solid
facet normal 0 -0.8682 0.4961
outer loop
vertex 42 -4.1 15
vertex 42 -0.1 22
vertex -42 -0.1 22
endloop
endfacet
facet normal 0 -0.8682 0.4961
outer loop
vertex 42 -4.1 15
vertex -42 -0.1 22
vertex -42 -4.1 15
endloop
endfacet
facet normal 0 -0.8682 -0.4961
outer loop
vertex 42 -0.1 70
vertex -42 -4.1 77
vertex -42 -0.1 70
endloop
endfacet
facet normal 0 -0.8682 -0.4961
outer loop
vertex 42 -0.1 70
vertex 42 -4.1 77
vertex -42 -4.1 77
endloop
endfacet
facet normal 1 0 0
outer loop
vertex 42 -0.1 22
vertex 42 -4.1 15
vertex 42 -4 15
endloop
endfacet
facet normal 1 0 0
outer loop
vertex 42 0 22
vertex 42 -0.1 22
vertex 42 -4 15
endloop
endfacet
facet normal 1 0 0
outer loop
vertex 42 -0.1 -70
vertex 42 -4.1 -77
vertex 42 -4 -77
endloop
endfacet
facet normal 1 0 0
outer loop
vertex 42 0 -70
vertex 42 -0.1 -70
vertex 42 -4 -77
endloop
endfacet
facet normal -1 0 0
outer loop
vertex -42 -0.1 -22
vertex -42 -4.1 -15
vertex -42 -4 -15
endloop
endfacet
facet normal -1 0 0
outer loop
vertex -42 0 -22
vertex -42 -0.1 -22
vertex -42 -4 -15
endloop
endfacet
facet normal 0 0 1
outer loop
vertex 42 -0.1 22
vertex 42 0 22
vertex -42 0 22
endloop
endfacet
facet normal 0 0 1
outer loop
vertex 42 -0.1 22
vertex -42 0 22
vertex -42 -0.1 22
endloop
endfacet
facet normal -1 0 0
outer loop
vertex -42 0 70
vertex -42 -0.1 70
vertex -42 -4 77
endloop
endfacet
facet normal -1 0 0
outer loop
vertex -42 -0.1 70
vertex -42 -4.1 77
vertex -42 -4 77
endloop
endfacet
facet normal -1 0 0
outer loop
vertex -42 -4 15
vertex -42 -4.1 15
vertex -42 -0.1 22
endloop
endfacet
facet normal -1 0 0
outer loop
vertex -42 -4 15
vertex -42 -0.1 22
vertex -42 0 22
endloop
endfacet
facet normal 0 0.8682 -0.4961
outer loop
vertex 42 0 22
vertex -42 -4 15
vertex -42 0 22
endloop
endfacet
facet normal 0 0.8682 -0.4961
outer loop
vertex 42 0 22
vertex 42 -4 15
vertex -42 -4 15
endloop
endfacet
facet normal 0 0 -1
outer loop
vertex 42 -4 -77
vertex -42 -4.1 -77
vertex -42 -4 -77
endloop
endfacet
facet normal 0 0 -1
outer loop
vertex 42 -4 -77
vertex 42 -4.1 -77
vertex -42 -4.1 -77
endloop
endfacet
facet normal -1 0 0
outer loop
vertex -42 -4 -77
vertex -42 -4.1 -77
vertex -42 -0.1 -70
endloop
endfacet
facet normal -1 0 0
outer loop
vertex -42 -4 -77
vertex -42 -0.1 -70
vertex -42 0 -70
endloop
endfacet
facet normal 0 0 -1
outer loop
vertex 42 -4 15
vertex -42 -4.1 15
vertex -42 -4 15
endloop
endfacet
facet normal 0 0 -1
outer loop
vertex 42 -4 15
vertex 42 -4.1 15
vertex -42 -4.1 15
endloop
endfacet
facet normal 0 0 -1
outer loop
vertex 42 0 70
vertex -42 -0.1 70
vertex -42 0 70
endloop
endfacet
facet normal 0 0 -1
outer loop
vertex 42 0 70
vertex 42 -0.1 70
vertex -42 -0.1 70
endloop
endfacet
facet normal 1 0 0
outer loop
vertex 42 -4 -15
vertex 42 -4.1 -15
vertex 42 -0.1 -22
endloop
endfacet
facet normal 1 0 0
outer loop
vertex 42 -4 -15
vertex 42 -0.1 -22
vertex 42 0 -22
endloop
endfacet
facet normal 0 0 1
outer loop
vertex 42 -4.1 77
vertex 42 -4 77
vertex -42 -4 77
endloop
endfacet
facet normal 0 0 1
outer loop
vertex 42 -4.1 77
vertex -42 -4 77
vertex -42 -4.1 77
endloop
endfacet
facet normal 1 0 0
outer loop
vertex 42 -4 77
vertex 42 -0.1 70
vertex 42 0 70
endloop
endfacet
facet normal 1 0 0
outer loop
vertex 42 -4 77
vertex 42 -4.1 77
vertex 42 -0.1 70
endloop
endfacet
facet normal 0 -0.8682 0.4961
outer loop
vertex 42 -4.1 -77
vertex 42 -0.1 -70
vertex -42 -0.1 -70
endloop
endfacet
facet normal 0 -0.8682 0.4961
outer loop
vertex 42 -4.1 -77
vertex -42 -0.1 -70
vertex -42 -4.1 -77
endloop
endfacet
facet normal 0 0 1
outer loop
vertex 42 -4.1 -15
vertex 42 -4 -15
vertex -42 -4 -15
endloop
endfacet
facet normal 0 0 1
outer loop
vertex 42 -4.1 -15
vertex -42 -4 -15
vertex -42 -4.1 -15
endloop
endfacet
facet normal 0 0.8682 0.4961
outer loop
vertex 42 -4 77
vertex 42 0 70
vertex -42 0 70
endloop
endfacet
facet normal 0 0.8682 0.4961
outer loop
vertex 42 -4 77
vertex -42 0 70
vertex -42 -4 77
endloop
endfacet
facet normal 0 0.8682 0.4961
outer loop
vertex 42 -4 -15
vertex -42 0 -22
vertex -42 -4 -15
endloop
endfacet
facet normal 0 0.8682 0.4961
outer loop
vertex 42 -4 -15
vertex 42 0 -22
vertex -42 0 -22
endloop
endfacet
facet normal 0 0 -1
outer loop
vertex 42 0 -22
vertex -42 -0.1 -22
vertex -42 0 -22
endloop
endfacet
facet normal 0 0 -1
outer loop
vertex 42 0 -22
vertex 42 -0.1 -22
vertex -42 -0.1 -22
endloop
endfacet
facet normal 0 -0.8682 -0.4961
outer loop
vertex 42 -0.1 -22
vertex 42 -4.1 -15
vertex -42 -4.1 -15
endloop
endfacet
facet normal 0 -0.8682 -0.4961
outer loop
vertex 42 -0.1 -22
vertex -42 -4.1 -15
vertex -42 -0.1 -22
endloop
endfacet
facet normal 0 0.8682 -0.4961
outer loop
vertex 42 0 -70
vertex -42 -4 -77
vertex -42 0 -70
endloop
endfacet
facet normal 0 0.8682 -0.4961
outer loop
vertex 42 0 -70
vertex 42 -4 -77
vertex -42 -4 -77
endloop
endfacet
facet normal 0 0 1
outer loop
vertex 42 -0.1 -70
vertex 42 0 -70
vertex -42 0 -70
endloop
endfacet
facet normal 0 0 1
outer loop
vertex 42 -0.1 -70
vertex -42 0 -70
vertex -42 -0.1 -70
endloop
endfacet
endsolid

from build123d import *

# Parameters (mm, degrees)
F1_DEPTH = 42


with BuildPart() as f1:
    # F0 (on Right) → F1 (new body, symmetric)
    with BuildSketch(Plane.YZ):
        Polygon((0, -22), (-4, -15), (-4.1, -15), (-0.1, -22), align=None)
    extrude(amount=F1_DEPTH, both=True)


with BuildPart() as f1b:
    # F0 (on Right) → F1, piece 2 (new body, symmetric)
    with BuildSketch(Plane.YZ):
        Polygon((-4, 15), (0, 22), (-0.1, 22), (-4.1, 15), align=None)
    extrude(amount=F1_DEPTH, both=True)


with BuildPart() as f1c:
    # F0 (on Right) → F1, piece 3 (new body, symmetric)
    with BuildSketch(Plane.YZ):
        Polygon((-0.1, 70), (0, 70), (-4, 77), (-4.1, 77), align=None)
    extrude(amount=F1_DEPTH, both=True)


with BuildPart() as f1d:
    # F0 (on Right) → F1, piece 4 (new body, symmetric)
    with BuildSketch(Plane.YZ):
        Polygon((-4, -77), (0, -70), (-0.1, -70), (-4.1, -77), align=None)
    extrude(amount=F1_DEPTH, both=True)


solid = Compound([f1.part, f1b.part, f1c.part, f1d.part])
